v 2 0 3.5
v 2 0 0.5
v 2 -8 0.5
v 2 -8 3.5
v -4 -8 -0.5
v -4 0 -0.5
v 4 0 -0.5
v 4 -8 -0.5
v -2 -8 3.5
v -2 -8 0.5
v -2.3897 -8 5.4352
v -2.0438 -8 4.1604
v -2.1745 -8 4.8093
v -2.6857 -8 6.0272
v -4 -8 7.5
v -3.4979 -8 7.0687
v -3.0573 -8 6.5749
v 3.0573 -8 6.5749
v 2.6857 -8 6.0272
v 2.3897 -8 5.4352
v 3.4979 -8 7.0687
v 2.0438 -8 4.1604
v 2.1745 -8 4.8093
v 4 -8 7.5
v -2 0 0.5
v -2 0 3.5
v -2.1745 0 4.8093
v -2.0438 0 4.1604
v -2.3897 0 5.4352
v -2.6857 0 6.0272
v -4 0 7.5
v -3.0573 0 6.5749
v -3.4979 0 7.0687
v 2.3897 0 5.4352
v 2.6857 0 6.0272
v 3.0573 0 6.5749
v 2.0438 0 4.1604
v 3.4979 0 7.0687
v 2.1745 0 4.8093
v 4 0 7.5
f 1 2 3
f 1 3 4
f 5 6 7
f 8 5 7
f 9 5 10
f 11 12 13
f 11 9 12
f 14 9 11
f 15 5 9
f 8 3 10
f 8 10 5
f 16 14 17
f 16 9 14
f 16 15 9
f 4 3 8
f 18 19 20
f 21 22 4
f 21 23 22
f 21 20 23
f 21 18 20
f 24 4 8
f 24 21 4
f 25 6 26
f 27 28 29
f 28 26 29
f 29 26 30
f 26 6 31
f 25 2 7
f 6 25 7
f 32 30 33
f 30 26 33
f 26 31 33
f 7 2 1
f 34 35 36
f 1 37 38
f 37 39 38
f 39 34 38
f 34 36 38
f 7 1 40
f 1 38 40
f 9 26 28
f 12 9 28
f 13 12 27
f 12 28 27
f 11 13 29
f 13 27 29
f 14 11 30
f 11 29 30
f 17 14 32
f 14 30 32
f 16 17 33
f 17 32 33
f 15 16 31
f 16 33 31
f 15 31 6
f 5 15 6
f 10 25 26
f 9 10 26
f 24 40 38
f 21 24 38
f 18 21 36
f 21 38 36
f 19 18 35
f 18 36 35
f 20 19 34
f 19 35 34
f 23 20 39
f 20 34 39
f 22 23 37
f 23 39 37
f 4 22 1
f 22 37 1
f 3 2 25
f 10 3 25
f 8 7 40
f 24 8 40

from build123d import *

# Parameters (mm, degrees)
F0_W        = 2
F0_H        = 7
F1_DEPTH    = 8
F2_T1_DEPTH = 28


# Not quite as in the source:
# - a fillet or chamfer that OpenCascade refuses, or shapes differently, is made with other operations: its cross-section is extruded or revolved along the edge and cut away or added


with BuildPart() as f1:
    # F0 (on Front) → F1 (new body)
    with BuildSketch(Plane.XZ):
        with Locations((-3, 4)):
            Rectangle(F0_W, F0_H)
        Polygon((-2, 0.5), (-4, 0.5), (-4, -0.5), (4, -0.5), (4, 0.5), (2, 0.5), align=None)
        with Locations((3, 4)):
            Rectangle(F0_W, F0_H)
    extrude(amount=F1_DEPTH)

    # F2: fillet of radius 5 on 2 edges, made by hand

    # F2_s2 → F2_t1 (cut)
    with BuildSketch(Plane.XZ.offset(-10)):
        with BuildLine():
            ThreePointArc((-2, 3.5), (-2.527864045, 5.7360679775), (-4, 7.5))
            Line((-4, 7.5), (-2, 7.5))
            Line((-2, 7.5), (-2, 3.5))
        make_face()
        with BuildLine():
            ThreePointArc((4, 7.5), (2.527864045, 5.7360679775), (2, 3.5))
            Line((2, 3.5), (2, 7.5))
            Line((2, 7.5), (4, 7.5))
        make_face()
    extrude(amount=F2_T1_DEPTH, mode=Mode.SUBTRACT)


solid = f1.part
